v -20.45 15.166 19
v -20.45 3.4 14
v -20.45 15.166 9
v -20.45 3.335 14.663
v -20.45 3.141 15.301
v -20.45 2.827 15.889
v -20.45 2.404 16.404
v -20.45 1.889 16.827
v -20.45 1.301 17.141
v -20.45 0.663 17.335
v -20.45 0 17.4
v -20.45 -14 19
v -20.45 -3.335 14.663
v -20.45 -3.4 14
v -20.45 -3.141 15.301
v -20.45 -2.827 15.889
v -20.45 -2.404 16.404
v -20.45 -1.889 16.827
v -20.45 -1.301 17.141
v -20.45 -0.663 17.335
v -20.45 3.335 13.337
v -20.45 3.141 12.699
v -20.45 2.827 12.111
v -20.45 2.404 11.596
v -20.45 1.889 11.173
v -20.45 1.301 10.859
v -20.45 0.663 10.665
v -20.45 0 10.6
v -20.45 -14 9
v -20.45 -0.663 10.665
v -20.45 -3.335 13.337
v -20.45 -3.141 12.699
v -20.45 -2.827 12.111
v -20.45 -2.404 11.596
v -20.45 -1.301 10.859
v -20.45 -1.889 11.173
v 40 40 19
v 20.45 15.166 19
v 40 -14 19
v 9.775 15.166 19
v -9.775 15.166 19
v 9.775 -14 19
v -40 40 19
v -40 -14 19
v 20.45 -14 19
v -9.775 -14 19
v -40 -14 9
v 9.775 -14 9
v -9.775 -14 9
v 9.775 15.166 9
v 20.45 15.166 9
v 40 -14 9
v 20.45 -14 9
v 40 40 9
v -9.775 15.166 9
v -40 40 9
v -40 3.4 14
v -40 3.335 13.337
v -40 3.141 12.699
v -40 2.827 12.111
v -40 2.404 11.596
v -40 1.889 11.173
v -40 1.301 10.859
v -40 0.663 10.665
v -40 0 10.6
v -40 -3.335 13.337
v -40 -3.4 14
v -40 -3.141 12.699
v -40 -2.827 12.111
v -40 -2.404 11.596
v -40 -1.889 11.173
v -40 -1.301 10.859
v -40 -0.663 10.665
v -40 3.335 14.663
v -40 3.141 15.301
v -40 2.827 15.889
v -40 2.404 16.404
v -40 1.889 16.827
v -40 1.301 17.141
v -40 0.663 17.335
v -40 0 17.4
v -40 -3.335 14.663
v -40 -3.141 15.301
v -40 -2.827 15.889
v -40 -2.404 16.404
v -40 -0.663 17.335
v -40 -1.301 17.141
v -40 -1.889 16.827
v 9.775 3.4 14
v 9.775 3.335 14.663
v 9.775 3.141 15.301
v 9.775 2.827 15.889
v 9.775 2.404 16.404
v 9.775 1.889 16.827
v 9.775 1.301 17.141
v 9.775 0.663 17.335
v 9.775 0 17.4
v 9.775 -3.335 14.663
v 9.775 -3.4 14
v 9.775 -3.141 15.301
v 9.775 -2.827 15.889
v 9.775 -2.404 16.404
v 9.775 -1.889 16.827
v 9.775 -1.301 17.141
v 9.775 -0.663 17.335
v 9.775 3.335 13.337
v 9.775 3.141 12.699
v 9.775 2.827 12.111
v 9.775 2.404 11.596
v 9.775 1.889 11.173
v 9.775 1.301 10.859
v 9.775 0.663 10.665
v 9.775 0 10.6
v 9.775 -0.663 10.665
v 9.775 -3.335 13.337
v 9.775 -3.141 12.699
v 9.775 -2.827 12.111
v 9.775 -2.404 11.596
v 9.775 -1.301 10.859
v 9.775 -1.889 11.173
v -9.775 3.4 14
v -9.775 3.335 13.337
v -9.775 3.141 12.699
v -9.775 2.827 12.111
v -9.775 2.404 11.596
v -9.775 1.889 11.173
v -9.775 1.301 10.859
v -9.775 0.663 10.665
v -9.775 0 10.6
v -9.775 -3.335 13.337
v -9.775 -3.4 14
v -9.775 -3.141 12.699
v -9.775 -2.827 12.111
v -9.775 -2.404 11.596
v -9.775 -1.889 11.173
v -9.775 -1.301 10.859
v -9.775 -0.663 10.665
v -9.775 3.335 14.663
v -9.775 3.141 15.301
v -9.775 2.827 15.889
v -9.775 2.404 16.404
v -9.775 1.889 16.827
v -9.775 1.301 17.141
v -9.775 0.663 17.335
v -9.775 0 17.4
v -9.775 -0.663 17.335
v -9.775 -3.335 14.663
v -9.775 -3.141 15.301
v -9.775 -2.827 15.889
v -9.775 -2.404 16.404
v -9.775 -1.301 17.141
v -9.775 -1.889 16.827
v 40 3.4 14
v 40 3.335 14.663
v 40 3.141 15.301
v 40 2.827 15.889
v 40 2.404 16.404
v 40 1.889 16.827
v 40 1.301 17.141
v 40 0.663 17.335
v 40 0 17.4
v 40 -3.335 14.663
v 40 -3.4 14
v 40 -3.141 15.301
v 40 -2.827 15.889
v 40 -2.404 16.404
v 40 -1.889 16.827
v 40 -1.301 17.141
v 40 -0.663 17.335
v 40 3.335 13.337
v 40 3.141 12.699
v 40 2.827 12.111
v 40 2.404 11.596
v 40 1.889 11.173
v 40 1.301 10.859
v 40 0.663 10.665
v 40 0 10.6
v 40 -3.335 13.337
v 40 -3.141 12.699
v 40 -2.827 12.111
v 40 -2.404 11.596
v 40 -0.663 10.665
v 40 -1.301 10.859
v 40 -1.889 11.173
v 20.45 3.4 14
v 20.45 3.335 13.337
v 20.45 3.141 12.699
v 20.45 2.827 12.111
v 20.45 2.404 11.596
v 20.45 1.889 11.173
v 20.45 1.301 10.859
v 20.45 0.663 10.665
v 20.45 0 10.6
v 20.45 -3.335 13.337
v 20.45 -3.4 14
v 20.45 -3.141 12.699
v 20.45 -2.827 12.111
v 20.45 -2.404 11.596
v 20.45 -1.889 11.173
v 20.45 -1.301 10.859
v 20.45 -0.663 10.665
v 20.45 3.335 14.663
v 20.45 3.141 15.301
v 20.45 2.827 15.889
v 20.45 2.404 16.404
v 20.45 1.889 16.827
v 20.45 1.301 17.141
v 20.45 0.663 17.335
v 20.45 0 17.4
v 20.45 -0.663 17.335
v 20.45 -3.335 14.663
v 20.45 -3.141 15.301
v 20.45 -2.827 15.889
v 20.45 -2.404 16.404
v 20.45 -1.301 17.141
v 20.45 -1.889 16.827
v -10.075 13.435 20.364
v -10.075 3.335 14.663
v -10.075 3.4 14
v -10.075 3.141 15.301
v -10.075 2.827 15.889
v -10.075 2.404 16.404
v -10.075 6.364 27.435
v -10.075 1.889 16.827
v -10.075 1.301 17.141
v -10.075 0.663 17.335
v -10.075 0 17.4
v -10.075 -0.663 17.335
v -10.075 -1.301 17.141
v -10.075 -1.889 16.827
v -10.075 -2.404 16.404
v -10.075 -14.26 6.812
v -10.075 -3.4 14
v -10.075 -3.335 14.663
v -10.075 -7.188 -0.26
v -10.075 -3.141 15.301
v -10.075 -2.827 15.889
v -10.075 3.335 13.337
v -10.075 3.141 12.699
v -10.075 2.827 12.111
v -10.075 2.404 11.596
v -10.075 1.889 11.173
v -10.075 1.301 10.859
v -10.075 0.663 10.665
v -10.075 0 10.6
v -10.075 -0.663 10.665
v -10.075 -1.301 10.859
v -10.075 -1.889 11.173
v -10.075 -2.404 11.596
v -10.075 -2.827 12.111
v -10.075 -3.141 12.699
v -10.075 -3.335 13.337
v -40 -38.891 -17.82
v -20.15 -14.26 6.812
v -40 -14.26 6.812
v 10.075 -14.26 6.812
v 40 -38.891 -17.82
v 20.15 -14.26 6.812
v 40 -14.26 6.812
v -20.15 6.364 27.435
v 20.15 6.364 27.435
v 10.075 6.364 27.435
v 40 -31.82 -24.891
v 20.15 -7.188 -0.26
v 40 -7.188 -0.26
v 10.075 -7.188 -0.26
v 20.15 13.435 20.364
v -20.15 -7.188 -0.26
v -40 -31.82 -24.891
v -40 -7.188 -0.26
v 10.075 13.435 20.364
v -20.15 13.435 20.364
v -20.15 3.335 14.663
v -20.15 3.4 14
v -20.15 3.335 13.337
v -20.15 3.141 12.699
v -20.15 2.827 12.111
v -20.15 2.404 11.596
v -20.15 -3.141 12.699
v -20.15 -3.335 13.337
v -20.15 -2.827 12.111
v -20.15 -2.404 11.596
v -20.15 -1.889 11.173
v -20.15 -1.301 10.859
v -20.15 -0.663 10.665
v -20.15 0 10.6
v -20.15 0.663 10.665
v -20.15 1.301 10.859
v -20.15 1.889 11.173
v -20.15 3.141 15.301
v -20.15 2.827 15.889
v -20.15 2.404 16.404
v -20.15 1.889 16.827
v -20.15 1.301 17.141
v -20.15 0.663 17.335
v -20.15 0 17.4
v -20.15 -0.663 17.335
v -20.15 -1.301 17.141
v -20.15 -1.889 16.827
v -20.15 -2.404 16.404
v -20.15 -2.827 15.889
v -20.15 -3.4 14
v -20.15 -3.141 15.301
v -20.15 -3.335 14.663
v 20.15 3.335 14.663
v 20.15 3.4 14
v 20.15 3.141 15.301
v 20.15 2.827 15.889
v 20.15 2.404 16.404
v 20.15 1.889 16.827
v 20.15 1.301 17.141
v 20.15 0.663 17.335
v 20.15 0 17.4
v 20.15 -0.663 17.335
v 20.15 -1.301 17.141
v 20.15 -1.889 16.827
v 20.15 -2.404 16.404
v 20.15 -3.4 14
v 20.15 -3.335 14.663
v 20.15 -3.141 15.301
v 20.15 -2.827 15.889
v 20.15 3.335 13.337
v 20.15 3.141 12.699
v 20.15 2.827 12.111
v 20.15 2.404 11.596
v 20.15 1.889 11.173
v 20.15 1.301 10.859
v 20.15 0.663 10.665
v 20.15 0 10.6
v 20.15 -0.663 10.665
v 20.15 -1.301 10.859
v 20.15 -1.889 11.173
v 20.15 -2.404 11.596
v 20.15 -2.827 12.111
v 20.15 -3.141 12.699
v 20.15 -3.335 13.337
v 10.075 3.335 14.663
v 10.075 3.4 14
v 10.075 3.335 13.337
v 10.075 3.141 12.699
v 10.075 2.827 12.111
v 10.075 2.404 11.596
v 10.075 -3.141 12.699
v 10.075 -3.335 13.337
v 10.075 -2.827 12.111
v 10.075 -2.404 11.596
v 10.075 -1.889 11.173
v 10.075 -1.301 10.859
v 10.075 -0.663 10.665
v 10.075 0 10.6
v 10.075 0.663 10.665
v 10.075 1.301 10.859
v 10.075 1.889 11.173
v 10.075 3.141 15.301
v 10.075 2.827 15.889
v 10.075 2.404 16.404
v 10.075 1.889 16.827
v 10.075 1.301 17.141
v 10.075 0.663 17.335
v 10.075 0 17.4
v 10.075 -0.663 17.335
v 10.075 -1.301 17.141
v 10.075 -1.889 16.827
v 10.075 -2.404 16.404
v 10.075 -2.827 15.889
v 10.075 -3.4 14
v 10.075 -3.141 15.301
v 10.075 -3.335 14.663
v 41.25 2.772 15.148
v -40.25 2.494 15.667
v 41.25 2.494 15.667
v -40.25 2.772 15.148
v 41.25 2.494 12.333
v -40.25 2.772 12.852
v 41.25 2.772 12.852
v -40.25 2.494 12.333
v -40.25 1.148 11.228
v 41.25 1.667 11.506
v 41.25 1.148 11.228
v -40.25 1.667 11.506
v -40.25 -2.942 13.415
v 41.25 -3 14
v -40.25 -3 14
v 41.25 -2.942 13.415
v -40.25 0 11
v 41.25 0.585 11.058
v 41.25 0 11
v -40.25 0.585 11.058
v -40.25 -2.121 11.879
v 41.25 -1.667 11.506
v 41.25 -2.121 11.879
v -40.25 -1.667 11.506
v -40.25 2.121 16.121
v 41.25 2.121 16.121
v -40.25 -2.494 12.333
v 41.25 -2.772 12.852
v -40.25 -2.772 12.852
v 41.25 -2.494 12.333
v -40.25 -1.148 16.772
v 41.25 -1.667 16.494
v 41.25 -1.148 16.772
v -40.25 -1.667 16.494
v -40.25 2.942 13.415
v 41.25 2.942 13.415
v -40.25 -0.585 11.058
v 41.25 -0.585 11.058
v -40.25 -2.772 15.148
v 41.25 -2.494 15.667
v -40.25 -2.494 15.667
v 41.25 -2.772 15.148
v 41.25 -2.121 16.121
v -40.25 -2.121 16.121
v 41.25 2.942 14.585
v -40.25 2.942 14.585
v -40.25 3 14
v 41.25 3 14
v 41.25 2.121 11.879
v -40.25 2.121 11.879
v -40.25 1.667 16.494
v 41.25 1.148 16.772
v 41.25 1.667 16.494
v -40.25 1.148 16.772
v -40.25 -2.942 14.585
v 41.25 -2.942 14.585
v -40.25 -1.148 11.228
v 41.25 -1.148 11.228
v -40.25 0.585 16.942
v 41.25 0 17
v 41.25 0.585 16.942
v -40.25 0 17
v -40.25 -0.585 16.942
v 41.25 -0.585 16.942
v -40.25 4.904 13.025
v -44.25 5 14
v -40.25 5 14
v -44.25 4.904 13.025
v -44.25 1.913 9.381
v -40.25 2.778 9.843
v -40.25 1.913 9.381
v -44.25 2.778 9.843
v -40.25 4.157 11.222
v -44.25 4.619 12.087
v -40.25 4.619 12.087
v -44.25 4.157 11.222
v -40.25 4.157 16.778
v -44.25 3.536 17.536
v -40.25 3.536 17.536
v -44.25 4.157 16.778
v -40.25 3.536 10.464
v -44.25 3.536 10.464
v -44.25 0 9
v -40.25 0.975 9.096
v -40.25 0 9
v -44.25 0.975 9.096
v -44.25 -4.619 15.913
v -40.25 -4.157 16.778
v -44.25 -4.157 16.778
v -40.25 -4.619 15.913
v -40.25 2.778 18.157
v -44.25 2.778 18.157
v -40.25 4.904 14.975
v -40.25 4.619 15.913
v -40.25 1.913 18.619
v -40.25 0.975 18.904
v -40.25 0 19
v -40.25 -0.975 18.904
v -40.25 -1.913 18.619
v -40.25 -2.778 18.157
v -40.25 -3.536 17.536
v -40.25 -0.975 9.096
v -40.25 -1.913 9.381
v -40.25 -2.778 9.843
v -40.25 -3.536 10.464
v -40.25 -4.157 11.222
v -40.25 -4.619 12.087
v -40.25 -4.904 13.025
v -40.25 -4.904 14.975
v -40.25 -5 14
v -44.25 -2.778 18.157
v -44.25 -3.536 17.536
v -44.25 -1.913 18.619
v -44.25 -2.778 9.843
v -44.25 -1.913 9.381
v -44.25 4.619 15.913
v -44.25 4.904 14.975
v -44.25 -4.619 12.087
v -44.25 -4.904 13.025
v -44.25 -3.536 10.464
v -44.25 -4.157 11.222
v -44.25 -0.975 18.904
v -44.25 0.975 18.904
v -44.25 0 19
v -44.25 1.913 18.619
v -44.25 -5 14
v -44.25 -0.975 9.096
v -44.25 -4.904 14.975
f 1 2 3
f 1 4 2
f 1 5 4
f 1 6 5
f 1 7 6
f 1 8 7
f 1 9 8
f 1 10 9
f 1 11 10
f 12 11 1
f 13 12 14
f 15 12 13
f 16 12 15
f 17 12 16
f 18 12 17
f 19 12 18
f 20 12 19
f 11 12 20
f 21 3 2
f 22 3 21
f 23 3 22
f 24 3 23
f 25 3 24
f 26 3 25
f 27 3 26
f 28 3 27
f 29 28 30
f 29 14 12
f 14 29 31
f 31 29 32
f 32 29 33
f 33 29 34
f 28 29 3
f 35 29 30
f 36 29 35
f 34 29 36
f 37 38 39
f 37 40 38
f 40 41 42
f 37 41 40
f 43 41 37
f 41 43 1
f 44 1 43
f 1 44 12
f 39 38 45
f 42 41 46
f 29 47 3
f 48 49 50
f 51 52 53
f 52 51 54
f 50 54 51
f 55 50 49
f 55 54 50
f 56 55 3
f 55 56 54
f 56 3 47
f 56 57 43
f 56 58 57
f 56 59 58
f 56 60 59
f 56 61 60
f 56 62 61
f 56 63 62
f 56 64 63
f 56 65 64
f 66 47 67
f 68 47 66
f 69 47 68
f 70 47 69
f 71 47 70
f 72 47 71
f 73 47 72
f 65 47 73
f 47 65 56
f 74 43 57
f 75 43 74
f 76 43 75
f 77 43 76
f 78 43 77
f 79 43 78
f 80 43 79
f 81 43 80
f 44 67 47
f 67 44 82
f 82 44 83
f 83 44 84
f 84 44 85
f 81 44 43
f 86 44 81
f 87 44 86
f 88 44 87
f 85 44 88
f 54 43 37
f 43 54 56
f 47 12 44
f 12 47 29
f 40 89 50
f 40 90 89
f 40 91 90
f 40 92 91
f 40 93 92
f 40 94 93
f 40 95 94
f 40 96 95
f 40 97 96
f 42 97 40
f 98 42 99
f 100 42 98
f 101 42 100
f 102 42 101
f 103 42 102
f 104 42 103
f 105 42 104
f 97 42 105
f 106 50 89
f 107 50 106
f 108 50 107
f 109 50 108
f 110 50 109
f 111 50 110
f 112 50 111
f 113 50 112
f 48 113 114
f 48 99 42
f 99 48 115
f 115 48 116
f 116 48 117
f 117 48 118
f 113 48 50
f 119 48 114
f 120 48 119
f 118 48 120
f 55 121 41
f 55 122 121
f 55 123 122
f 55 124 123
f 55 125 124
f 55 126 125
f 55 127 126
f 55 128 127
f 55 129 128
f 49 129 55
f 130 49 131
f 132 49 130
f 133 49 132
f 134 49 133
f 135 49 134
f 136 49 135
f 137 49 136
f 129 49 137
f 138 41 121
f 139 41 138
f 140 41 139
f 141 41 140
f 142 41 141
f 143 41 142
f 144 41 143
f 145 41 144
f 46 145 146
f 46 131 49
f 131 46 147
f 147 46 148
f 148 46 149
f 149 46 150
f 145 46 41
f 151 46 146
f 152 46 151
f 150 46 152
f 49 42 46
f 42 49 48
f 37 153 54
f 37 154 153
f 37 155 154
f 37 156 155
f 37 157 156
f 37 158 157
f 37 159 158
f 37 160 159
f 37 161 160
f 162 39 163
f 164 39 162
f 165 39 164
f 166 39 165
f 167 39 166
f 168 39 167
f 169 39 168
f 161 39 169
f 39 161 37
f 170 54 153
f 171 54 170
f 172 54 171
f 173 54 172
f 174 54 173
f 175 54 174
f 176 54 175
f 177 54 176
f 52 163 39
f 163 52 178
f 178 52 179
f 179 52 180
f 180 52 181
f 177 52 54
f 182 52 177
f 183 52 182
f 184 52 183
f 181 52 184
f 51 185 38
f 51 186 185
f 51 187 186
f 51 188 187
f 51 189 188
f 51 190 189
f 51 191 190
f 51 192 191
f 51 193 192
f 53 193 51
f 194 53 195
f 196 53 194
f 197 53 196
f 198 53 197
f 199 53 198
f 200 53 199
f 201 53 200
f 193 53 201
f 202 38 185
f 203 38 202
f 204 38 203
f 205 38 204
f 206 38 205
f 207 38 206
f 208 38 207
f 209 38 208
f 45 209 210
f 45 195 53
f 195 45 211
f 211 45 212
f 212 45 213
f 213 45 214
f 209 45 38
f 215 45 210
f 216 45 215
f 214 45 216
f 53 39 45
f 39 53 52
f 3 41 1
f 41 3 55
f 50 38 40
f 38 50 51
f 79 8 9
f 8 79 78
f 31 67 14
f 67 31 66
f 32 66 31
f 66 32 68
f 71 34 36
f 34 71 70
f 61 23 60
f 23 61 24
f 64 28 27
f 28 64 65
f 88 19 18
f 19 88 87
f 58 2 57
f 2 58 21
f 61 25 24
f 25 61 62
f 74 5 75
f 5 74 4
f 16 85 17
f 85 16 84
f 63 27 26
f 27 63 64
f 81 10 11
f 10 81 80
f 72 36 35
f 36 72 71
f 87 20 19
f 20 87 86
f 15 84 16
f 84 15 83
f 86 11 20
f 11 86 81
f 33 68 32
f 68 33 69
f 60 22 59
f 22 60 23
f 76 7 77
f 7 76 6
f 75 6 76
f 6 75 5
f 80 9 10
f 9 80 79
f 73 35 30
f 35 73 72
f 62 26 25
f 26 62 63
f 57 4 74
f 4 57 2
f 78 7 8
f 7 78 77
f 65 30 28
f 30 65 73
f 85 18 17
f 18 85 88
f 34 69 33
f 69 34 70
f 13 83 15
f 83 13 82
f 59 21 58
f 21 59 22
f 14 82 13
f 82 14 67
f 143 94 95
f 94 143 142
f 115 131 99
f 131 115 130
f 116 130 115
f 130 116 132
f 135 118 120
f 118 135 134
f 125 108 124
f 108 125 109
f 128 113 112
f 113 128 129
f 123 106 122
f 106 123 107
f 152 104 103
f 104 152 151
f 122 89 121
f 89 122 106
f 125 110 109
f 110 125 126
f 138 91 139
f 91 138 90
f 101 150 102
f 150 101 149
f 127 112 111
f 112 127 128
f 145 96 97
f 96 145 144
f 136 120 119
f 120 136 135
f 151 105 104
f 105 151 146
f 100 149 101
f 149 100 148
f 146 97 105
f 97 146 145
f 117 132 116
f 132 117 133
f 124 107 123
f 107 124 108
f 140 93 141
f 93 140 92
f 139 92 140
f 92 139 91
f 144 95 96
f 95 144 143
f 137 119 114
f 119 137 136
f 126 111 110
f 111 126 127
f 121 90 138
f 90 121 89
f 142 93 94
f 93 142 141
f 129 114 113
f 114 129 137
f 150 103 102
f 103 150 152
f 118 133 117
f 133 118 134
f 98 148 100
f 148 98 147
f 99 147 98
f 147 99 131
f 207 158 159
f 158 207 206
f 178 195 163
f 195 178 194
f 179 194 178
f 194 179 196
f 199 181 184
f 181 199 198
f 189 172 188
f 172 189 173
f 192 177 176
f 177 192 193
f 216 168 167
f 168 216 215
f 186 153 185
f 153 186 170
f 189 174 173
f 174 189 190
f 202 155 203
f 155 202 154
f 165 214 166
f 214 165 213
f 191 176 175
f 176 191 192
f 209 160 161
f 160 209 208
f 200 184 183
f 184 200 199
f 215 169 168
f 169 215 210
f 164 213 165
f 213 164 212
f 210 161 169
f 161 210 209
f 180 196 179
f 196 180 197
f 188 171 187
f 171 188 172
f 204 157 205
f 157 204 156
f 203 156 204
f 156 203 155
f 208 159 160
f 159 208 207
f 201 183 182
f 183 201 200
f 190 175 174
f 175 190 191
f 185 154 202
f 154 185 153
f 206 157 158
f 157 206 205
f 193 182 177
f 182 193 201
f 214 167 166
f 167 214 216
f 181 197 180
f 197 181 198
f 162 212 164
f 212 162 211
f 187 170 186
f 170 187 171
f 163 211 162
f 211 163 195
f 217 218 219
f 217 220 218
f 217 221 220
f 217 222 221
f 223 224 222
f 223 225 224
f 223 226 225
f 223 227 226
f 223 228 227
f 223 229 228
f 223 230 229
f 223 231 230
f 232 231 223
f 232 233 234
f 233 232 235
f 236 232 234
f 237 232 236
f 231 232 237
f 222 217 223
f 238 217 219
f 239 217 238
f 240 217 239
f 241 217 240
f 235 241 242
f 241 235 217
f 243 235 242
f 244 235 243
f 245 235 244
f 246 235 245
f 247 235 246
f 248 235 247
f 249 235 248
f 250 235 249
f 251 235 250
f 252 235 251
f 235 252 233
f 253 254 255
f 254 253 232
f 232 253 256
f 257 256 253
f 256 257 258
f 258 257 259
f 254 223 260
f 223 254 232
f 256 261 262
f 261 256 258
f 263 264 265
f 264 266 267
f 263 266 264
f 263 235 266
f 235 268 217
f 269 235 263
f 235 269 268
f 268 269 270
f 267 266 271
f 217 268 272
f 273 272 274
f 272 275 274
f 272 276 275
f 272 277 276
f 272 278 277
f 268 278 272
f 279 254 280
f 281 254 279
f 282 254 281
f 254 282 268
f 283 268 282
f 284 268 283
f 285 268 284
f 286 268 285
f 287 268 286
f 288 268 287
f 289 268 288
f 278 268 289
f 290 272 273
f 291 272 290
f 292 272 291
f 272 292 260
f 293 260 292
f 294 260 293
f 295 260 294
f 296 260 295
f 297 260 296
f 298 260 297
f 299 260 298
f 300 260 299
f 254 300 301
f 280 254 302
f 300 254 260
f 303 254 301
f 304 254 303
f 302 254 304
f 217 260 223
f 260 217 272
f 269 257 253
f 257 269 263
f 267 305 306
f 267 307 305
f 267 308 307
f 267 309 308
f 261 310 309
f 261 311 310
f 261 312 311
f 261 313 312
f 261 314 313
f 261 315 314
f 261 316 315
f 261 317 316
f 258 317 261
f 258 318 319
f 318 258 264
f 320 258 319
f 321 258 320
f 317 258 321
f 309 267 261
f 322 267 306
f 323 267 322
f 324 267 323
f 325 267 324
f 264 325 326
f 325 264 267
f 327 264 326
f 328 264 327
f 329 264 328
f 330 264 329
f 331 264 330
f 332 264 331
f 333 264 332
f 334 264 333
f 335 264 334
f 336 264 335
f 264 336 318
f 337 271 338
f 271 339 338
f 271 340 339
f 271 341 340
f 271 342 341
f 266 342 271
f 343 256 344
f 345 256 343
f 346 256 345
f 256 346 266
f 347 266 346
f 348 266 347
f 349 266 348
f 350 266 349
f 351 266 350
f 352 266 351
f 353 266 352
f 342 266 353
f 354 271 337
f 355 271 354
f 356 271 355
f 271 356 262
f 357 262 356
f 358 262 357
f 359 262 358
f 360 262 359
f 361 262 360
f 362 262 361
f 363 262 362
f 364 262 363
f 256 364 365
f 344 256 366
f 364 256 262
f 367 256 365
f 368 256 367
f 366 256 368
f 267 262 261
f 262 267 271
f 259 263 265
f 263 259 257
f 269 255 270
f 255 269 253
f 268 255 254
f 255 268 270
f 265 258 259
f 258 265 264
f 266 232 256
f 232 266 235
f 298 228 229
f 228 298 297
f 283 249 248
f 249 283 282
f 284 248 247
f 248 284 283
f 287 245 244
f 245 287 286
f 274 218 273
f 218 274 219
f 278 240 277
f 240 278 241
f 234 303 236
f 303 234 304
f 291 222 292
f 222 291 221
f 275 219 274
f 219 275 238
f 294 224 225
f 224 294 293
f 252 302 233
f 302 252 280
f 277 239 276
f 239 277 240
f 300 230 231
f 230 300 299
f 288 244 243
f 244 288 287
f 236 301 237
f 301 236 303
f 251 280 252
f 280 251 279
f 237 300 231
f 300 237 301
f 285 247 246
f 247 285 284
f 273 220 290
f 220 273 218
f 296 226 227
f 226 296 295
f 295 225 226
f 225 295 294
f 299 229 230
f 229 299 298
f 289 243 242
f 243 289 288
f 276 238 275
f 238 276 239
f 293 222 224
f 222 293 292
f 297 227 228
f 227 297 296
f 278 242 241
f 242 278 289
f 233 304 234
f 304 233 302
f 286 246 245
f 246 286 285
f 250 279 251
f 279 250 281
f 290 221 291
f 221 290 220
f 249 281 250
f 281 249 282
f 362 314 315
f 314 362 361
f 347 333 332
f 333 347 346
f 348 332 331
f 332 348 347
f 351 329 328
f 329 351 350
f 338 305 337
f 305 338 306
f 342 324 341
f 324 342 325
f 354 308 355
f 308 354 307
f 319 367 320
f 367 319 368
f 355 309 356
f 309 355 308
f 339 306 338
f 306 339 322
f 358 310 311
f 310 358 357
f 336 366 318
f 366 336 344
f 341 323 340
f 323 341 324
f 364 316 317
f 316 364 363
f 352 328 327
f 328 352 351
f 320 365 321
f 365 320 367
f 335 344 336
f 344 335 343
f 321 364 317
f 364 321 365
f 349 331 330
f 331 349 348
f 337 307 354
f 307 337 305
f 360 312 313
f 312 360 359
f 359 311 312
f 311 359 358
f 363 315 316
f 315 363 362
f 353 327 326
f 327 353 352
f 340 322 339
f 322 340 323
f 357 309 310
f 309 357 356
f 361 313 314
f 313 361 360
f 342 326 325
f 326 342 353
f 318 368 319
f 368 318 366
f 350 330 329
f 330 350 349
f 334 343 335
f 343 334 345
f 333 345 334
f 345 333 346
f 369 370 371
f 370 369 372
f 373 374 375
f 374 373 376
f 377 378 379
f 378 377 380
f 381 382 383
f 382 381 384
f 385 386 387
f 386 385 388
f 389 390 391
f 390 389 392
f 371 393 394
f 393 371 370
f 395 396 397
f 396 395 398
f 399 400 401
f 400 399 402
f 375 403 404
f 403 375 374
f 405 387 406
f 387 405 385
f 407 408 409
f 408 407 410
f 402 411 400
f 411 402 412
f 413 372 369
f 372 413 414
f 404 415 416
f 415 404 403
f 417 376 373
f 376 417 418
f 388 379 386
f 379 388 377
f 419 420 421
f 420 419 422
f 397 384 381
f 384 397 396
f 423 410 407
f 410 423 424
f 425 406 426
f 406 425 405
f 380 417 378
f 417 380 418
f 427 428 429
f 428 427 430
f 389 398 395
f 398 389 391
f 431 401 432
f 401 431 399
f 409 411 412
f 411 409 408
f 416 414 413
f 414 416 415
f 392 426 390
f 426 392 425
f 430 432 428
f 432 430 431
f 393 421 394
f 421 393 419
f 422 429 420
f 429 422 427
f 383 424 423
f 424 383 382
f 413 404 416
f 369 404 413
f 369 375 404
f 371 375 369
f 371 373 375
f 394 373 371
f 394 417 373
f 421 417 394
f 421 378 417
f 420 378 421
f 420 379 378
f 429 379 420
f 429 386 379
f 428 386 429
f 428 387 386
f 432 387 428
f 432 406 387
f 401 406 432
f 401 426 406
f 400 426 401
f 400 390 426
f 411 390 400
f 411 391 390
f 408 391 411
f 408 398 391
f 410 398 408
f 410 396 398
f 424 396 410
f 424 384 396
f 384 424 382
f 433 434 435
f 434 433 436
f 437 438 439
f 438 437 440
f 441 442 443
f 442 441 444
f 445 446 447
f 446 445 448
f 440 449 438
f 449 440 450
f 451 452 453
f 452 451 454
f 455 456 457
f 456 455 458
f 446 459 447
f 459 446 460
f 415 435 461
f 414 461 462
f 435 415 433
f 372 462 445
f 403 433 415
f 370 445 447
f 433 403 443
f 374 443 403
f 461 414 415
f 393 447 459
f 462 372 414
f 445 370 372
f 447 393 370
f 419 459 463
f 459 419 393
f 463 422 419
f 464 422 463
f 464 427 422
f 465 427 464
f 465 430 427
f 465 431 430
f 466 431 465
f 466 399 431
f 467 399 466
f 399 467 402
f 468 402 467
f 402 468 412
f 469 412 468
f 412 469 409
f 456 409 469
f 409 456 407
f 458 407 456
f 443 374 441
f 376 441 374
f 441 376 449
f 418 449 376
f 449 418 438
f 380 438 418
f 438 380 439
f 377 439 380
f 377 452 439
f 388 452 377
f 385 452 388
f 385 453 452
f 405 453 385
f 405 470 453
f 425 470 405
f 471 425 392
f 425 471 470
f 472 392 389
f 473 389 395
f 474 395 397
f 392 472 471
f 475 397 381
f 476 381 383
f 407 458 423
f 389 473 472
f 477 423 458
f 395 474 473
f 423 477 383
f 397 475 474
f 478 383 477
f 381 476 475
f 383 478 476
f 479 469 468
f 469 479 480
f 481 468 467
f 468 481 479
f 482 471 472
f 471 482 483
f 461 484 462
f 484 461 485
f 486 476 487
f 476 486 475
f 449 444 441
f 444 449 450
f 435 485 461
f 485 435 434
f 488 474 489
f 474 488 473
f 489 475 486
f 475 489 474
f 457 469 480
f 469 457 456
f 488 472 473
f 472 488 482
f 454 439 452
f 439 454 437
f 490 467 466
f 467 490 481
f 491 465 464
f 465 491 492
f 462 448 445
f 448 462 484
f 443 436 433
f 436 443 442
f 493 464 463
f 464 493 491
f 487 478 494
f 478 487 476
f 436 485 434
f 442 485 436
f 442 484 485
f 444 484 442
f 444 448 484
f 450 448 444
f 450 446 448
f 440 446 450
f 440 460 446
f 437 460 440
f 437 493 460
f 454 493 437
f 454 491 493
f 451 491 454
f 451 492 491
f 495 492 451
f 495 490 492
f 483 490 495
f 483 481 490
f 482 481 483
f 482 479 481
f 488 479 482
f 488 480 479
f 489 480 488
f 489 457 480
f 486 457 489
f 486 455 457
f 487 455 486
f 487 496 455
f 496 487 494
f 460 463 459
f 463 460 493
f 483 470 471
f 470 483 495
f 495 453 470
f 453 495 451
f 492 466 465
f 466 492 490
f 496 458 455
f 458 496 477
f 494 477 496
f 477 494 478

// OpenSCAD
$fn = 32;

// ------------------------------------------------------------------------
// Butt hinge: hinge 80 mm, leaf swung 45 deg
// Every part is its own module, assembly() places every instance.
// ------------------------------------------------------------------------

// --- part 1 ---
module hinge_base() {
  difference() {
    union() {
      translate([-40, -14, -5]) cube([19.55, 54, 10]);
      translate([-9.775, -14, -5]) cube([19.55, 54, 10]);
      translate([20.45, -14, -5]) cube([19.55, 54, 10]);
      translate([-40, 15.166, -5]) cube([80, 24.834, 10]);
    }
    translate([-30.225, 0, 0]) rotate([0, 90, 0]) cylinder(h = 21.55, d = 6.8, center = true);
    translate([0, 0, 0]) rotate([0, 90, 0]) cylinder(h = 21.55, d = 6.8, center = true);
    translate([30.225, 0, 0]) rotate([0, 90, 0]) cylinder(h = 21.55, d = 6.8, center = true);
  }
}

// --- part 2 ---
module hinge_mover() {
  difference() {
    union() {
      translate([-20.15, -50, -5]) cube([10.075, 64, 10]);
      translate([10.075, -50, -5]) cube([10.075, 64, 10]);
      translate([-40, -50, -5]) cube([80, 34.834, 10]);
    }
    translate([-15.113, 0, 0]) rotate([0, 90, 0]) cylinder(h = 12.075, d = 6.8, center = true);
    translate([15.113, 0, 0]) rotate([0, 90, 0]) cylinder(h = 12.075, d = 6.8, center = true);
  }
}

// --- part 3 ---
module hinge_pin() {
  rotate([0, 90, 0]) cylinder(h = 82.5, d = 6, center = true);
  translate([-44.25, 0, 0]) rotate([0, 90, 0]) cylinder(h = 4, d = 10);
}

// --- assembly ---
module assembly() {
  color([0.80, 0.24, 0.20]) translate([0, 0, 14]) rotate([0, 0, 0]) hinge_base();
  color([0.20, 0.45, 0.75]) translate([0, 0, 14]) rotate([45, 0, 0]) hinge_mover();
  color([0.25, 0.62, 0.32]) translate([0, 0, 14]) rotate([0, 0, 0]) hinge_pin();
}

assembly();
